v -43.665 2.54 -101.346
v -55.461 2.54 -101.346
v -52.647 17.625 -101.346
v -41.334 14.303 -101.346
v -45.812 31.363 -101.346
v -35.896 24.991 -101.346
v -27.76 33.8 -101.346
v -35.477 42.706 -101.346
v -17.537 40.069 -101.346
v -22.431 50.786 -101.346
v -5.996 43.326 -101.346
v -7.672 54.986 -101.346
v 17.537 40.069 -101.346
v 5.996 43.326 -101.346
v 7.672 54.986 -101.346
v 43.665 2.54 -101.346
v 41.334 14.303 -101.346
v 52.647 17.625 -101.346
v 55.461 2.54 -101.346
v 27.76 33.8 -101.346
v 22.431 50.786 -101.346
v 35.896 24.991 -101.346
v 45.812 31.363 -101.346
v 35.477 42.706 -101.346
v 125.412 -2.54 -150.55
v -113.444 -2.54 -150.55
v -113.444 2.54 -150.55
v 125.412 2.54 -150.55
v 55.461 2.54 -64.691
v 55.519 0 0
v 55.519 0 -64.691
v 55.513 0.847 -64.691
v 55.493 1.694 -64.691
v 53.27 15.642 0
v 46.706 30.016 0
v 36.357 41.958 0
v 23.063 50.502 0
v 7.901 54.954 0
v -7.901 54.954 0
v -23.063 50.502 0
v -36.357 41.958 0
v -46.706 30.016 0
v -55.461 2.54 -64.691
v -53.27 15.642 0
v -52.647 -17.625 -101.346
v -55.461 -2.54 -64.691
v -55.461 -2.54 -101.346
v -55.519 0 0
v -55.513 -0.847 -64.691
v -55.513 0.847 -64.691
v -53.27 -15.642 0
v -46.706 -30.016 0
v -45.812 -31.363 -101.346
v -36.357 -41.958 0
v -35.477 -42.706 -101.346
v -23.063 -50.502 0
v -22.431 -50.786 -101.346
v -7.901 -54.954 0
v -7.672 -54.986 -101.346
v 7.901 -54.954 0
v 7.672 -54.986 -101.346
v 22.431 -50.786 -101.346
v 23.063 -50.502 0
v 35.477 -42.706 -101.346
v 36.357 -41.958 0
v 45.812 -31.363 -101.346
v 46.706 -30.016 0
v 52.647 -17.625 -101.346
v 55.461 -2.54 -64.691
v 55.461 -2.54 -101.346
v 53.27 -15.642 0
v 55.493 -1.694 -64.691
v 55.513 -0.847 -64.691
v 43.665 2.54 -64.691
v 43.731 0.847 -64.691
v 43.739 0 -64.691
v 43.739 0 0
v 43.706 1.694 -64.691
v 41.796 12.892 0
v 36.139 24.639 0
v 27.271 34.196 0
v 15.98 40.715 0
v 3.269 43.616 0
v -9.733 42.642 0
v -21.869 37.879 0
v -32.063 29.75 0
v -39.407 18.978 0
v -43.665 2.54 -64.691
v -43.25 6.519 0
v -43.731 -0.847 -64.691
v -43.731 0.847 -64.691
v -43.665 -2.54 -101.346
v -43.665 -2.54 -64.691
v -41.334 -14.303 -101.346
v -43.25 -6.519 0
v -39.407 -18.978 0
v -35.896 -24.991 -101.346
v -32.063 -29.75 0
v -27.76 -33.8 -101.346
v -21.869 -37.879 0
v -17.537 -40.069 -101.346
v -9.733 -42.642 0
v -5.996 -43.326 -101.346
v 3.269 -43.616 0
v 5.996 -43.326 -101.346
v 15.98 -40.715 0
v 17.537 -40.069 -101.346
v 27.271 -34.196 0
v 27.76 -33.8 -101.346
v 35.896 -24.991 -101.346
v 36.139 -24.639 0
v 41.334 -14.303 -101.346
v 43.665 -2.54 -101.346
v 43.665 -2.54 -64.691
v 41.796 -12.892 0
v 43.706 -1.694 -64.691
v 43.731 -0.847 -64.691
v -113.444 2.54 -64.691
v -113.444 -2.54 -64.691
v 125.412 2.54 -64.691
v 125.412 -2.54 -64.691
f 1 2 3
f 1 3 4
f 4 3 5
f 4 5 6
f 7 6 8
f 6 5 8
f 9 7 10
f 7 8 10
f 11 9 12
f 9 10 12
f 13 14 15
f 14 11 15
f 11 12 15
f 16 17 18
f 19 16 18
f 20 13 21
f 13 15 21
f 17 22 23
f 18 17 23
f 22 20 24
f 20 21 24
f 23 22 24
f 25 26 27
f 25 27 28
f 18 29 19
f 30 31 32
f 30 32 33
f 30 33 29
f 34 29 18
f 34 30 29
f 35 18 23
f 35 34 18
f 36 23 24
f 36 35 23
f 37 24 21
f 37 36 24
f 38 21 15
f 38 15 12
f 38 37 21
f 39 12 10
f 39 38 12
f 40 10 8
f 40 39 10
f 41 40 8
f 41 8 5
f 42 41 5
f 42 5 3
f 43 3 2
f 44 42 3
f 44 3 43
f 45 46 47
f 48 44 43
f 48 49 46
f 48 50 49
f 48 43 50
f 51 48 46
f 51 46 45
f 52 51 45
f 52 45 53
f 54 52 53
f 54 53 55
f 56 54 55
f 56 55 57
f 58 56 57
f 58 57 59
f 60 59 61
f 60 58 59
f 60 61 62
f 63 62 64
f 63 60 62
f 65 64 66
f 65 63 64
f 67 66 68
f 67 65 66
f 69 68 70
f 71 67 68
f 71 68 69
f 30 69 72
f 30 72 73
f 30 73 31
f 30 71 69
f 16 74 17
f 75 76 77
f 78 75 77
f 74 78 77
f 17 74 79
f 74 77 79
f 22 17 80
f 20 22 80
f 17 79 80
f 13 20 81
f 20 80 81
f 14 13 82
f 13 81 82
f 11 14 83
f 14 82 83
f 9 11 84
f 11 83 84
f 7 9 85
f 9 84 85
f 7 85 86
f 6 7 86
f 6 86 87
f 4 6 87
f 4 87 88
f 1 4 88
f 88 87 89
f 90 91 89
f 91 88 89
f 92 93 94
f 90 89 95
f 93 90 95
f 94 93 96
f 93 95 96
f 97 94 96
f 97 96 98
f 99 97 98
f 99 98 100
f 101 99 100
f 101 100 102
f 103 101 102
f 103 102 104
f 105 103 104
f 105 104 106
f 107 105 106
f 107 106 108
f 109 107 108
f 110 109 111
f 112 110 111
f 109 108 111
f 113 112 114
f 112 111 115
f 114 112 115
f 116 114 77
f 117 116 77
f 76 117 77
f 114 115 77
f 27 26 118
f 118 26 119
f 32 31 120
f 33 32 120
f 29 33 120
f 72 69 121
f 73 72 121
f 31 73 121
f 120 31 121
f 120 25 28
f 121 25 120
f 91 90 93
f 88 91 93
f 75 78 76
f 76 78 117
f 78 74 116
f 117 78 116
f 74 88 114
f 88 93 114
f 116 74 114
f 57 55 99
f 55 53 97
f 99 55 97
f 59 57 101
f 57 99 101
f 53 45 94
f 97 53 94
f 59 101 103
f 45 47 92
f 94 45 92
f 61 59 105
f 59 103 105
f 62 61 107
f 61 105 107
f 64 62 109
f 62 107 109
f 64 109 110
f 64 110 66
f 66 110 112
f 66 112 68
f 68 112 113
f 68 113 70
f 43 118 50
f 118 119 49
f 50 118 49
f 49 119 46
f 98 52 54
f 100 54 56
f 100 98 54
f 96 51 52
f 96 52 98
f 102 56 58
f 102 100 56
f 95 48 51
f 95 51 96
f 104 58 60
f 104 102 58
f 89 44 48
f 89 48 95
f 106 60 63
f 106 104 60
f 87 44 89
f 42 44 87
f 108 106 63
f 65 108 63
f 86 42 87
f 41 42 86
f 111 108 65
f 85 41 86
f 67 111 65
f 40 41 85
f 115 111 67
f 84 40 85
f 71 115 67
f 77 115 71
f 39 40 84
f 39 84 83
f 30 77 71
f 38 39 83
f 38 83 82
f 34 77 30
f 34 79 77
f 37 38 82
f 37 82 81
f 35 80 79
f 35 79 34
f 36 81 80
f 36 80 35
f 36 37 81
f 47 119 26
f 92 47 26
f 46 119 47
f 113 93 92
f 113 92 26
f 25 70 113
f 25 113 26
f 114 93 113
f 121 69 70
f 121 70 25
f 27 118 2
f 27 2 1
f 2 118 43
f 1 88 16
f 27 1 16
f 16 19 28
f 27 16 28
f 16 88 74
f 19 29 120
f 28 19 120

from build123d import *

# Parameters (mm, degrees)
F0_R          = 55.519011
F0_R_2        = 43.738793
F1_DEPTH      = 101.346
F2_W          = 238.856115
F2_H          = 85.85909
F3_DEPTH      = 2.54
F3_DEPTH_BACK = 2.54


with BuildPart() as f1:
    # F0 (on Top) → F1 (new body)
    with BuildSketch(Plane.XY):
        Circle(F0_R)
        Circle(F0_R_2, mode=Mode.SUBTRACT)
    extrude(amount=-F1_DEPTH)

    # F2 (on Front) → F3 (join, two sides)
    with BuildSketch(Plane.XZ) as f3_sk:
        with Locations((5.983558, -107.62085)):
            Rectangle(F2_W, F2_H)
    extrude(amount=F3_DEPTH)
    extrude(f3_sk.sketch, amount=-F3_DEPTH_BACK)


solid = f1.part
